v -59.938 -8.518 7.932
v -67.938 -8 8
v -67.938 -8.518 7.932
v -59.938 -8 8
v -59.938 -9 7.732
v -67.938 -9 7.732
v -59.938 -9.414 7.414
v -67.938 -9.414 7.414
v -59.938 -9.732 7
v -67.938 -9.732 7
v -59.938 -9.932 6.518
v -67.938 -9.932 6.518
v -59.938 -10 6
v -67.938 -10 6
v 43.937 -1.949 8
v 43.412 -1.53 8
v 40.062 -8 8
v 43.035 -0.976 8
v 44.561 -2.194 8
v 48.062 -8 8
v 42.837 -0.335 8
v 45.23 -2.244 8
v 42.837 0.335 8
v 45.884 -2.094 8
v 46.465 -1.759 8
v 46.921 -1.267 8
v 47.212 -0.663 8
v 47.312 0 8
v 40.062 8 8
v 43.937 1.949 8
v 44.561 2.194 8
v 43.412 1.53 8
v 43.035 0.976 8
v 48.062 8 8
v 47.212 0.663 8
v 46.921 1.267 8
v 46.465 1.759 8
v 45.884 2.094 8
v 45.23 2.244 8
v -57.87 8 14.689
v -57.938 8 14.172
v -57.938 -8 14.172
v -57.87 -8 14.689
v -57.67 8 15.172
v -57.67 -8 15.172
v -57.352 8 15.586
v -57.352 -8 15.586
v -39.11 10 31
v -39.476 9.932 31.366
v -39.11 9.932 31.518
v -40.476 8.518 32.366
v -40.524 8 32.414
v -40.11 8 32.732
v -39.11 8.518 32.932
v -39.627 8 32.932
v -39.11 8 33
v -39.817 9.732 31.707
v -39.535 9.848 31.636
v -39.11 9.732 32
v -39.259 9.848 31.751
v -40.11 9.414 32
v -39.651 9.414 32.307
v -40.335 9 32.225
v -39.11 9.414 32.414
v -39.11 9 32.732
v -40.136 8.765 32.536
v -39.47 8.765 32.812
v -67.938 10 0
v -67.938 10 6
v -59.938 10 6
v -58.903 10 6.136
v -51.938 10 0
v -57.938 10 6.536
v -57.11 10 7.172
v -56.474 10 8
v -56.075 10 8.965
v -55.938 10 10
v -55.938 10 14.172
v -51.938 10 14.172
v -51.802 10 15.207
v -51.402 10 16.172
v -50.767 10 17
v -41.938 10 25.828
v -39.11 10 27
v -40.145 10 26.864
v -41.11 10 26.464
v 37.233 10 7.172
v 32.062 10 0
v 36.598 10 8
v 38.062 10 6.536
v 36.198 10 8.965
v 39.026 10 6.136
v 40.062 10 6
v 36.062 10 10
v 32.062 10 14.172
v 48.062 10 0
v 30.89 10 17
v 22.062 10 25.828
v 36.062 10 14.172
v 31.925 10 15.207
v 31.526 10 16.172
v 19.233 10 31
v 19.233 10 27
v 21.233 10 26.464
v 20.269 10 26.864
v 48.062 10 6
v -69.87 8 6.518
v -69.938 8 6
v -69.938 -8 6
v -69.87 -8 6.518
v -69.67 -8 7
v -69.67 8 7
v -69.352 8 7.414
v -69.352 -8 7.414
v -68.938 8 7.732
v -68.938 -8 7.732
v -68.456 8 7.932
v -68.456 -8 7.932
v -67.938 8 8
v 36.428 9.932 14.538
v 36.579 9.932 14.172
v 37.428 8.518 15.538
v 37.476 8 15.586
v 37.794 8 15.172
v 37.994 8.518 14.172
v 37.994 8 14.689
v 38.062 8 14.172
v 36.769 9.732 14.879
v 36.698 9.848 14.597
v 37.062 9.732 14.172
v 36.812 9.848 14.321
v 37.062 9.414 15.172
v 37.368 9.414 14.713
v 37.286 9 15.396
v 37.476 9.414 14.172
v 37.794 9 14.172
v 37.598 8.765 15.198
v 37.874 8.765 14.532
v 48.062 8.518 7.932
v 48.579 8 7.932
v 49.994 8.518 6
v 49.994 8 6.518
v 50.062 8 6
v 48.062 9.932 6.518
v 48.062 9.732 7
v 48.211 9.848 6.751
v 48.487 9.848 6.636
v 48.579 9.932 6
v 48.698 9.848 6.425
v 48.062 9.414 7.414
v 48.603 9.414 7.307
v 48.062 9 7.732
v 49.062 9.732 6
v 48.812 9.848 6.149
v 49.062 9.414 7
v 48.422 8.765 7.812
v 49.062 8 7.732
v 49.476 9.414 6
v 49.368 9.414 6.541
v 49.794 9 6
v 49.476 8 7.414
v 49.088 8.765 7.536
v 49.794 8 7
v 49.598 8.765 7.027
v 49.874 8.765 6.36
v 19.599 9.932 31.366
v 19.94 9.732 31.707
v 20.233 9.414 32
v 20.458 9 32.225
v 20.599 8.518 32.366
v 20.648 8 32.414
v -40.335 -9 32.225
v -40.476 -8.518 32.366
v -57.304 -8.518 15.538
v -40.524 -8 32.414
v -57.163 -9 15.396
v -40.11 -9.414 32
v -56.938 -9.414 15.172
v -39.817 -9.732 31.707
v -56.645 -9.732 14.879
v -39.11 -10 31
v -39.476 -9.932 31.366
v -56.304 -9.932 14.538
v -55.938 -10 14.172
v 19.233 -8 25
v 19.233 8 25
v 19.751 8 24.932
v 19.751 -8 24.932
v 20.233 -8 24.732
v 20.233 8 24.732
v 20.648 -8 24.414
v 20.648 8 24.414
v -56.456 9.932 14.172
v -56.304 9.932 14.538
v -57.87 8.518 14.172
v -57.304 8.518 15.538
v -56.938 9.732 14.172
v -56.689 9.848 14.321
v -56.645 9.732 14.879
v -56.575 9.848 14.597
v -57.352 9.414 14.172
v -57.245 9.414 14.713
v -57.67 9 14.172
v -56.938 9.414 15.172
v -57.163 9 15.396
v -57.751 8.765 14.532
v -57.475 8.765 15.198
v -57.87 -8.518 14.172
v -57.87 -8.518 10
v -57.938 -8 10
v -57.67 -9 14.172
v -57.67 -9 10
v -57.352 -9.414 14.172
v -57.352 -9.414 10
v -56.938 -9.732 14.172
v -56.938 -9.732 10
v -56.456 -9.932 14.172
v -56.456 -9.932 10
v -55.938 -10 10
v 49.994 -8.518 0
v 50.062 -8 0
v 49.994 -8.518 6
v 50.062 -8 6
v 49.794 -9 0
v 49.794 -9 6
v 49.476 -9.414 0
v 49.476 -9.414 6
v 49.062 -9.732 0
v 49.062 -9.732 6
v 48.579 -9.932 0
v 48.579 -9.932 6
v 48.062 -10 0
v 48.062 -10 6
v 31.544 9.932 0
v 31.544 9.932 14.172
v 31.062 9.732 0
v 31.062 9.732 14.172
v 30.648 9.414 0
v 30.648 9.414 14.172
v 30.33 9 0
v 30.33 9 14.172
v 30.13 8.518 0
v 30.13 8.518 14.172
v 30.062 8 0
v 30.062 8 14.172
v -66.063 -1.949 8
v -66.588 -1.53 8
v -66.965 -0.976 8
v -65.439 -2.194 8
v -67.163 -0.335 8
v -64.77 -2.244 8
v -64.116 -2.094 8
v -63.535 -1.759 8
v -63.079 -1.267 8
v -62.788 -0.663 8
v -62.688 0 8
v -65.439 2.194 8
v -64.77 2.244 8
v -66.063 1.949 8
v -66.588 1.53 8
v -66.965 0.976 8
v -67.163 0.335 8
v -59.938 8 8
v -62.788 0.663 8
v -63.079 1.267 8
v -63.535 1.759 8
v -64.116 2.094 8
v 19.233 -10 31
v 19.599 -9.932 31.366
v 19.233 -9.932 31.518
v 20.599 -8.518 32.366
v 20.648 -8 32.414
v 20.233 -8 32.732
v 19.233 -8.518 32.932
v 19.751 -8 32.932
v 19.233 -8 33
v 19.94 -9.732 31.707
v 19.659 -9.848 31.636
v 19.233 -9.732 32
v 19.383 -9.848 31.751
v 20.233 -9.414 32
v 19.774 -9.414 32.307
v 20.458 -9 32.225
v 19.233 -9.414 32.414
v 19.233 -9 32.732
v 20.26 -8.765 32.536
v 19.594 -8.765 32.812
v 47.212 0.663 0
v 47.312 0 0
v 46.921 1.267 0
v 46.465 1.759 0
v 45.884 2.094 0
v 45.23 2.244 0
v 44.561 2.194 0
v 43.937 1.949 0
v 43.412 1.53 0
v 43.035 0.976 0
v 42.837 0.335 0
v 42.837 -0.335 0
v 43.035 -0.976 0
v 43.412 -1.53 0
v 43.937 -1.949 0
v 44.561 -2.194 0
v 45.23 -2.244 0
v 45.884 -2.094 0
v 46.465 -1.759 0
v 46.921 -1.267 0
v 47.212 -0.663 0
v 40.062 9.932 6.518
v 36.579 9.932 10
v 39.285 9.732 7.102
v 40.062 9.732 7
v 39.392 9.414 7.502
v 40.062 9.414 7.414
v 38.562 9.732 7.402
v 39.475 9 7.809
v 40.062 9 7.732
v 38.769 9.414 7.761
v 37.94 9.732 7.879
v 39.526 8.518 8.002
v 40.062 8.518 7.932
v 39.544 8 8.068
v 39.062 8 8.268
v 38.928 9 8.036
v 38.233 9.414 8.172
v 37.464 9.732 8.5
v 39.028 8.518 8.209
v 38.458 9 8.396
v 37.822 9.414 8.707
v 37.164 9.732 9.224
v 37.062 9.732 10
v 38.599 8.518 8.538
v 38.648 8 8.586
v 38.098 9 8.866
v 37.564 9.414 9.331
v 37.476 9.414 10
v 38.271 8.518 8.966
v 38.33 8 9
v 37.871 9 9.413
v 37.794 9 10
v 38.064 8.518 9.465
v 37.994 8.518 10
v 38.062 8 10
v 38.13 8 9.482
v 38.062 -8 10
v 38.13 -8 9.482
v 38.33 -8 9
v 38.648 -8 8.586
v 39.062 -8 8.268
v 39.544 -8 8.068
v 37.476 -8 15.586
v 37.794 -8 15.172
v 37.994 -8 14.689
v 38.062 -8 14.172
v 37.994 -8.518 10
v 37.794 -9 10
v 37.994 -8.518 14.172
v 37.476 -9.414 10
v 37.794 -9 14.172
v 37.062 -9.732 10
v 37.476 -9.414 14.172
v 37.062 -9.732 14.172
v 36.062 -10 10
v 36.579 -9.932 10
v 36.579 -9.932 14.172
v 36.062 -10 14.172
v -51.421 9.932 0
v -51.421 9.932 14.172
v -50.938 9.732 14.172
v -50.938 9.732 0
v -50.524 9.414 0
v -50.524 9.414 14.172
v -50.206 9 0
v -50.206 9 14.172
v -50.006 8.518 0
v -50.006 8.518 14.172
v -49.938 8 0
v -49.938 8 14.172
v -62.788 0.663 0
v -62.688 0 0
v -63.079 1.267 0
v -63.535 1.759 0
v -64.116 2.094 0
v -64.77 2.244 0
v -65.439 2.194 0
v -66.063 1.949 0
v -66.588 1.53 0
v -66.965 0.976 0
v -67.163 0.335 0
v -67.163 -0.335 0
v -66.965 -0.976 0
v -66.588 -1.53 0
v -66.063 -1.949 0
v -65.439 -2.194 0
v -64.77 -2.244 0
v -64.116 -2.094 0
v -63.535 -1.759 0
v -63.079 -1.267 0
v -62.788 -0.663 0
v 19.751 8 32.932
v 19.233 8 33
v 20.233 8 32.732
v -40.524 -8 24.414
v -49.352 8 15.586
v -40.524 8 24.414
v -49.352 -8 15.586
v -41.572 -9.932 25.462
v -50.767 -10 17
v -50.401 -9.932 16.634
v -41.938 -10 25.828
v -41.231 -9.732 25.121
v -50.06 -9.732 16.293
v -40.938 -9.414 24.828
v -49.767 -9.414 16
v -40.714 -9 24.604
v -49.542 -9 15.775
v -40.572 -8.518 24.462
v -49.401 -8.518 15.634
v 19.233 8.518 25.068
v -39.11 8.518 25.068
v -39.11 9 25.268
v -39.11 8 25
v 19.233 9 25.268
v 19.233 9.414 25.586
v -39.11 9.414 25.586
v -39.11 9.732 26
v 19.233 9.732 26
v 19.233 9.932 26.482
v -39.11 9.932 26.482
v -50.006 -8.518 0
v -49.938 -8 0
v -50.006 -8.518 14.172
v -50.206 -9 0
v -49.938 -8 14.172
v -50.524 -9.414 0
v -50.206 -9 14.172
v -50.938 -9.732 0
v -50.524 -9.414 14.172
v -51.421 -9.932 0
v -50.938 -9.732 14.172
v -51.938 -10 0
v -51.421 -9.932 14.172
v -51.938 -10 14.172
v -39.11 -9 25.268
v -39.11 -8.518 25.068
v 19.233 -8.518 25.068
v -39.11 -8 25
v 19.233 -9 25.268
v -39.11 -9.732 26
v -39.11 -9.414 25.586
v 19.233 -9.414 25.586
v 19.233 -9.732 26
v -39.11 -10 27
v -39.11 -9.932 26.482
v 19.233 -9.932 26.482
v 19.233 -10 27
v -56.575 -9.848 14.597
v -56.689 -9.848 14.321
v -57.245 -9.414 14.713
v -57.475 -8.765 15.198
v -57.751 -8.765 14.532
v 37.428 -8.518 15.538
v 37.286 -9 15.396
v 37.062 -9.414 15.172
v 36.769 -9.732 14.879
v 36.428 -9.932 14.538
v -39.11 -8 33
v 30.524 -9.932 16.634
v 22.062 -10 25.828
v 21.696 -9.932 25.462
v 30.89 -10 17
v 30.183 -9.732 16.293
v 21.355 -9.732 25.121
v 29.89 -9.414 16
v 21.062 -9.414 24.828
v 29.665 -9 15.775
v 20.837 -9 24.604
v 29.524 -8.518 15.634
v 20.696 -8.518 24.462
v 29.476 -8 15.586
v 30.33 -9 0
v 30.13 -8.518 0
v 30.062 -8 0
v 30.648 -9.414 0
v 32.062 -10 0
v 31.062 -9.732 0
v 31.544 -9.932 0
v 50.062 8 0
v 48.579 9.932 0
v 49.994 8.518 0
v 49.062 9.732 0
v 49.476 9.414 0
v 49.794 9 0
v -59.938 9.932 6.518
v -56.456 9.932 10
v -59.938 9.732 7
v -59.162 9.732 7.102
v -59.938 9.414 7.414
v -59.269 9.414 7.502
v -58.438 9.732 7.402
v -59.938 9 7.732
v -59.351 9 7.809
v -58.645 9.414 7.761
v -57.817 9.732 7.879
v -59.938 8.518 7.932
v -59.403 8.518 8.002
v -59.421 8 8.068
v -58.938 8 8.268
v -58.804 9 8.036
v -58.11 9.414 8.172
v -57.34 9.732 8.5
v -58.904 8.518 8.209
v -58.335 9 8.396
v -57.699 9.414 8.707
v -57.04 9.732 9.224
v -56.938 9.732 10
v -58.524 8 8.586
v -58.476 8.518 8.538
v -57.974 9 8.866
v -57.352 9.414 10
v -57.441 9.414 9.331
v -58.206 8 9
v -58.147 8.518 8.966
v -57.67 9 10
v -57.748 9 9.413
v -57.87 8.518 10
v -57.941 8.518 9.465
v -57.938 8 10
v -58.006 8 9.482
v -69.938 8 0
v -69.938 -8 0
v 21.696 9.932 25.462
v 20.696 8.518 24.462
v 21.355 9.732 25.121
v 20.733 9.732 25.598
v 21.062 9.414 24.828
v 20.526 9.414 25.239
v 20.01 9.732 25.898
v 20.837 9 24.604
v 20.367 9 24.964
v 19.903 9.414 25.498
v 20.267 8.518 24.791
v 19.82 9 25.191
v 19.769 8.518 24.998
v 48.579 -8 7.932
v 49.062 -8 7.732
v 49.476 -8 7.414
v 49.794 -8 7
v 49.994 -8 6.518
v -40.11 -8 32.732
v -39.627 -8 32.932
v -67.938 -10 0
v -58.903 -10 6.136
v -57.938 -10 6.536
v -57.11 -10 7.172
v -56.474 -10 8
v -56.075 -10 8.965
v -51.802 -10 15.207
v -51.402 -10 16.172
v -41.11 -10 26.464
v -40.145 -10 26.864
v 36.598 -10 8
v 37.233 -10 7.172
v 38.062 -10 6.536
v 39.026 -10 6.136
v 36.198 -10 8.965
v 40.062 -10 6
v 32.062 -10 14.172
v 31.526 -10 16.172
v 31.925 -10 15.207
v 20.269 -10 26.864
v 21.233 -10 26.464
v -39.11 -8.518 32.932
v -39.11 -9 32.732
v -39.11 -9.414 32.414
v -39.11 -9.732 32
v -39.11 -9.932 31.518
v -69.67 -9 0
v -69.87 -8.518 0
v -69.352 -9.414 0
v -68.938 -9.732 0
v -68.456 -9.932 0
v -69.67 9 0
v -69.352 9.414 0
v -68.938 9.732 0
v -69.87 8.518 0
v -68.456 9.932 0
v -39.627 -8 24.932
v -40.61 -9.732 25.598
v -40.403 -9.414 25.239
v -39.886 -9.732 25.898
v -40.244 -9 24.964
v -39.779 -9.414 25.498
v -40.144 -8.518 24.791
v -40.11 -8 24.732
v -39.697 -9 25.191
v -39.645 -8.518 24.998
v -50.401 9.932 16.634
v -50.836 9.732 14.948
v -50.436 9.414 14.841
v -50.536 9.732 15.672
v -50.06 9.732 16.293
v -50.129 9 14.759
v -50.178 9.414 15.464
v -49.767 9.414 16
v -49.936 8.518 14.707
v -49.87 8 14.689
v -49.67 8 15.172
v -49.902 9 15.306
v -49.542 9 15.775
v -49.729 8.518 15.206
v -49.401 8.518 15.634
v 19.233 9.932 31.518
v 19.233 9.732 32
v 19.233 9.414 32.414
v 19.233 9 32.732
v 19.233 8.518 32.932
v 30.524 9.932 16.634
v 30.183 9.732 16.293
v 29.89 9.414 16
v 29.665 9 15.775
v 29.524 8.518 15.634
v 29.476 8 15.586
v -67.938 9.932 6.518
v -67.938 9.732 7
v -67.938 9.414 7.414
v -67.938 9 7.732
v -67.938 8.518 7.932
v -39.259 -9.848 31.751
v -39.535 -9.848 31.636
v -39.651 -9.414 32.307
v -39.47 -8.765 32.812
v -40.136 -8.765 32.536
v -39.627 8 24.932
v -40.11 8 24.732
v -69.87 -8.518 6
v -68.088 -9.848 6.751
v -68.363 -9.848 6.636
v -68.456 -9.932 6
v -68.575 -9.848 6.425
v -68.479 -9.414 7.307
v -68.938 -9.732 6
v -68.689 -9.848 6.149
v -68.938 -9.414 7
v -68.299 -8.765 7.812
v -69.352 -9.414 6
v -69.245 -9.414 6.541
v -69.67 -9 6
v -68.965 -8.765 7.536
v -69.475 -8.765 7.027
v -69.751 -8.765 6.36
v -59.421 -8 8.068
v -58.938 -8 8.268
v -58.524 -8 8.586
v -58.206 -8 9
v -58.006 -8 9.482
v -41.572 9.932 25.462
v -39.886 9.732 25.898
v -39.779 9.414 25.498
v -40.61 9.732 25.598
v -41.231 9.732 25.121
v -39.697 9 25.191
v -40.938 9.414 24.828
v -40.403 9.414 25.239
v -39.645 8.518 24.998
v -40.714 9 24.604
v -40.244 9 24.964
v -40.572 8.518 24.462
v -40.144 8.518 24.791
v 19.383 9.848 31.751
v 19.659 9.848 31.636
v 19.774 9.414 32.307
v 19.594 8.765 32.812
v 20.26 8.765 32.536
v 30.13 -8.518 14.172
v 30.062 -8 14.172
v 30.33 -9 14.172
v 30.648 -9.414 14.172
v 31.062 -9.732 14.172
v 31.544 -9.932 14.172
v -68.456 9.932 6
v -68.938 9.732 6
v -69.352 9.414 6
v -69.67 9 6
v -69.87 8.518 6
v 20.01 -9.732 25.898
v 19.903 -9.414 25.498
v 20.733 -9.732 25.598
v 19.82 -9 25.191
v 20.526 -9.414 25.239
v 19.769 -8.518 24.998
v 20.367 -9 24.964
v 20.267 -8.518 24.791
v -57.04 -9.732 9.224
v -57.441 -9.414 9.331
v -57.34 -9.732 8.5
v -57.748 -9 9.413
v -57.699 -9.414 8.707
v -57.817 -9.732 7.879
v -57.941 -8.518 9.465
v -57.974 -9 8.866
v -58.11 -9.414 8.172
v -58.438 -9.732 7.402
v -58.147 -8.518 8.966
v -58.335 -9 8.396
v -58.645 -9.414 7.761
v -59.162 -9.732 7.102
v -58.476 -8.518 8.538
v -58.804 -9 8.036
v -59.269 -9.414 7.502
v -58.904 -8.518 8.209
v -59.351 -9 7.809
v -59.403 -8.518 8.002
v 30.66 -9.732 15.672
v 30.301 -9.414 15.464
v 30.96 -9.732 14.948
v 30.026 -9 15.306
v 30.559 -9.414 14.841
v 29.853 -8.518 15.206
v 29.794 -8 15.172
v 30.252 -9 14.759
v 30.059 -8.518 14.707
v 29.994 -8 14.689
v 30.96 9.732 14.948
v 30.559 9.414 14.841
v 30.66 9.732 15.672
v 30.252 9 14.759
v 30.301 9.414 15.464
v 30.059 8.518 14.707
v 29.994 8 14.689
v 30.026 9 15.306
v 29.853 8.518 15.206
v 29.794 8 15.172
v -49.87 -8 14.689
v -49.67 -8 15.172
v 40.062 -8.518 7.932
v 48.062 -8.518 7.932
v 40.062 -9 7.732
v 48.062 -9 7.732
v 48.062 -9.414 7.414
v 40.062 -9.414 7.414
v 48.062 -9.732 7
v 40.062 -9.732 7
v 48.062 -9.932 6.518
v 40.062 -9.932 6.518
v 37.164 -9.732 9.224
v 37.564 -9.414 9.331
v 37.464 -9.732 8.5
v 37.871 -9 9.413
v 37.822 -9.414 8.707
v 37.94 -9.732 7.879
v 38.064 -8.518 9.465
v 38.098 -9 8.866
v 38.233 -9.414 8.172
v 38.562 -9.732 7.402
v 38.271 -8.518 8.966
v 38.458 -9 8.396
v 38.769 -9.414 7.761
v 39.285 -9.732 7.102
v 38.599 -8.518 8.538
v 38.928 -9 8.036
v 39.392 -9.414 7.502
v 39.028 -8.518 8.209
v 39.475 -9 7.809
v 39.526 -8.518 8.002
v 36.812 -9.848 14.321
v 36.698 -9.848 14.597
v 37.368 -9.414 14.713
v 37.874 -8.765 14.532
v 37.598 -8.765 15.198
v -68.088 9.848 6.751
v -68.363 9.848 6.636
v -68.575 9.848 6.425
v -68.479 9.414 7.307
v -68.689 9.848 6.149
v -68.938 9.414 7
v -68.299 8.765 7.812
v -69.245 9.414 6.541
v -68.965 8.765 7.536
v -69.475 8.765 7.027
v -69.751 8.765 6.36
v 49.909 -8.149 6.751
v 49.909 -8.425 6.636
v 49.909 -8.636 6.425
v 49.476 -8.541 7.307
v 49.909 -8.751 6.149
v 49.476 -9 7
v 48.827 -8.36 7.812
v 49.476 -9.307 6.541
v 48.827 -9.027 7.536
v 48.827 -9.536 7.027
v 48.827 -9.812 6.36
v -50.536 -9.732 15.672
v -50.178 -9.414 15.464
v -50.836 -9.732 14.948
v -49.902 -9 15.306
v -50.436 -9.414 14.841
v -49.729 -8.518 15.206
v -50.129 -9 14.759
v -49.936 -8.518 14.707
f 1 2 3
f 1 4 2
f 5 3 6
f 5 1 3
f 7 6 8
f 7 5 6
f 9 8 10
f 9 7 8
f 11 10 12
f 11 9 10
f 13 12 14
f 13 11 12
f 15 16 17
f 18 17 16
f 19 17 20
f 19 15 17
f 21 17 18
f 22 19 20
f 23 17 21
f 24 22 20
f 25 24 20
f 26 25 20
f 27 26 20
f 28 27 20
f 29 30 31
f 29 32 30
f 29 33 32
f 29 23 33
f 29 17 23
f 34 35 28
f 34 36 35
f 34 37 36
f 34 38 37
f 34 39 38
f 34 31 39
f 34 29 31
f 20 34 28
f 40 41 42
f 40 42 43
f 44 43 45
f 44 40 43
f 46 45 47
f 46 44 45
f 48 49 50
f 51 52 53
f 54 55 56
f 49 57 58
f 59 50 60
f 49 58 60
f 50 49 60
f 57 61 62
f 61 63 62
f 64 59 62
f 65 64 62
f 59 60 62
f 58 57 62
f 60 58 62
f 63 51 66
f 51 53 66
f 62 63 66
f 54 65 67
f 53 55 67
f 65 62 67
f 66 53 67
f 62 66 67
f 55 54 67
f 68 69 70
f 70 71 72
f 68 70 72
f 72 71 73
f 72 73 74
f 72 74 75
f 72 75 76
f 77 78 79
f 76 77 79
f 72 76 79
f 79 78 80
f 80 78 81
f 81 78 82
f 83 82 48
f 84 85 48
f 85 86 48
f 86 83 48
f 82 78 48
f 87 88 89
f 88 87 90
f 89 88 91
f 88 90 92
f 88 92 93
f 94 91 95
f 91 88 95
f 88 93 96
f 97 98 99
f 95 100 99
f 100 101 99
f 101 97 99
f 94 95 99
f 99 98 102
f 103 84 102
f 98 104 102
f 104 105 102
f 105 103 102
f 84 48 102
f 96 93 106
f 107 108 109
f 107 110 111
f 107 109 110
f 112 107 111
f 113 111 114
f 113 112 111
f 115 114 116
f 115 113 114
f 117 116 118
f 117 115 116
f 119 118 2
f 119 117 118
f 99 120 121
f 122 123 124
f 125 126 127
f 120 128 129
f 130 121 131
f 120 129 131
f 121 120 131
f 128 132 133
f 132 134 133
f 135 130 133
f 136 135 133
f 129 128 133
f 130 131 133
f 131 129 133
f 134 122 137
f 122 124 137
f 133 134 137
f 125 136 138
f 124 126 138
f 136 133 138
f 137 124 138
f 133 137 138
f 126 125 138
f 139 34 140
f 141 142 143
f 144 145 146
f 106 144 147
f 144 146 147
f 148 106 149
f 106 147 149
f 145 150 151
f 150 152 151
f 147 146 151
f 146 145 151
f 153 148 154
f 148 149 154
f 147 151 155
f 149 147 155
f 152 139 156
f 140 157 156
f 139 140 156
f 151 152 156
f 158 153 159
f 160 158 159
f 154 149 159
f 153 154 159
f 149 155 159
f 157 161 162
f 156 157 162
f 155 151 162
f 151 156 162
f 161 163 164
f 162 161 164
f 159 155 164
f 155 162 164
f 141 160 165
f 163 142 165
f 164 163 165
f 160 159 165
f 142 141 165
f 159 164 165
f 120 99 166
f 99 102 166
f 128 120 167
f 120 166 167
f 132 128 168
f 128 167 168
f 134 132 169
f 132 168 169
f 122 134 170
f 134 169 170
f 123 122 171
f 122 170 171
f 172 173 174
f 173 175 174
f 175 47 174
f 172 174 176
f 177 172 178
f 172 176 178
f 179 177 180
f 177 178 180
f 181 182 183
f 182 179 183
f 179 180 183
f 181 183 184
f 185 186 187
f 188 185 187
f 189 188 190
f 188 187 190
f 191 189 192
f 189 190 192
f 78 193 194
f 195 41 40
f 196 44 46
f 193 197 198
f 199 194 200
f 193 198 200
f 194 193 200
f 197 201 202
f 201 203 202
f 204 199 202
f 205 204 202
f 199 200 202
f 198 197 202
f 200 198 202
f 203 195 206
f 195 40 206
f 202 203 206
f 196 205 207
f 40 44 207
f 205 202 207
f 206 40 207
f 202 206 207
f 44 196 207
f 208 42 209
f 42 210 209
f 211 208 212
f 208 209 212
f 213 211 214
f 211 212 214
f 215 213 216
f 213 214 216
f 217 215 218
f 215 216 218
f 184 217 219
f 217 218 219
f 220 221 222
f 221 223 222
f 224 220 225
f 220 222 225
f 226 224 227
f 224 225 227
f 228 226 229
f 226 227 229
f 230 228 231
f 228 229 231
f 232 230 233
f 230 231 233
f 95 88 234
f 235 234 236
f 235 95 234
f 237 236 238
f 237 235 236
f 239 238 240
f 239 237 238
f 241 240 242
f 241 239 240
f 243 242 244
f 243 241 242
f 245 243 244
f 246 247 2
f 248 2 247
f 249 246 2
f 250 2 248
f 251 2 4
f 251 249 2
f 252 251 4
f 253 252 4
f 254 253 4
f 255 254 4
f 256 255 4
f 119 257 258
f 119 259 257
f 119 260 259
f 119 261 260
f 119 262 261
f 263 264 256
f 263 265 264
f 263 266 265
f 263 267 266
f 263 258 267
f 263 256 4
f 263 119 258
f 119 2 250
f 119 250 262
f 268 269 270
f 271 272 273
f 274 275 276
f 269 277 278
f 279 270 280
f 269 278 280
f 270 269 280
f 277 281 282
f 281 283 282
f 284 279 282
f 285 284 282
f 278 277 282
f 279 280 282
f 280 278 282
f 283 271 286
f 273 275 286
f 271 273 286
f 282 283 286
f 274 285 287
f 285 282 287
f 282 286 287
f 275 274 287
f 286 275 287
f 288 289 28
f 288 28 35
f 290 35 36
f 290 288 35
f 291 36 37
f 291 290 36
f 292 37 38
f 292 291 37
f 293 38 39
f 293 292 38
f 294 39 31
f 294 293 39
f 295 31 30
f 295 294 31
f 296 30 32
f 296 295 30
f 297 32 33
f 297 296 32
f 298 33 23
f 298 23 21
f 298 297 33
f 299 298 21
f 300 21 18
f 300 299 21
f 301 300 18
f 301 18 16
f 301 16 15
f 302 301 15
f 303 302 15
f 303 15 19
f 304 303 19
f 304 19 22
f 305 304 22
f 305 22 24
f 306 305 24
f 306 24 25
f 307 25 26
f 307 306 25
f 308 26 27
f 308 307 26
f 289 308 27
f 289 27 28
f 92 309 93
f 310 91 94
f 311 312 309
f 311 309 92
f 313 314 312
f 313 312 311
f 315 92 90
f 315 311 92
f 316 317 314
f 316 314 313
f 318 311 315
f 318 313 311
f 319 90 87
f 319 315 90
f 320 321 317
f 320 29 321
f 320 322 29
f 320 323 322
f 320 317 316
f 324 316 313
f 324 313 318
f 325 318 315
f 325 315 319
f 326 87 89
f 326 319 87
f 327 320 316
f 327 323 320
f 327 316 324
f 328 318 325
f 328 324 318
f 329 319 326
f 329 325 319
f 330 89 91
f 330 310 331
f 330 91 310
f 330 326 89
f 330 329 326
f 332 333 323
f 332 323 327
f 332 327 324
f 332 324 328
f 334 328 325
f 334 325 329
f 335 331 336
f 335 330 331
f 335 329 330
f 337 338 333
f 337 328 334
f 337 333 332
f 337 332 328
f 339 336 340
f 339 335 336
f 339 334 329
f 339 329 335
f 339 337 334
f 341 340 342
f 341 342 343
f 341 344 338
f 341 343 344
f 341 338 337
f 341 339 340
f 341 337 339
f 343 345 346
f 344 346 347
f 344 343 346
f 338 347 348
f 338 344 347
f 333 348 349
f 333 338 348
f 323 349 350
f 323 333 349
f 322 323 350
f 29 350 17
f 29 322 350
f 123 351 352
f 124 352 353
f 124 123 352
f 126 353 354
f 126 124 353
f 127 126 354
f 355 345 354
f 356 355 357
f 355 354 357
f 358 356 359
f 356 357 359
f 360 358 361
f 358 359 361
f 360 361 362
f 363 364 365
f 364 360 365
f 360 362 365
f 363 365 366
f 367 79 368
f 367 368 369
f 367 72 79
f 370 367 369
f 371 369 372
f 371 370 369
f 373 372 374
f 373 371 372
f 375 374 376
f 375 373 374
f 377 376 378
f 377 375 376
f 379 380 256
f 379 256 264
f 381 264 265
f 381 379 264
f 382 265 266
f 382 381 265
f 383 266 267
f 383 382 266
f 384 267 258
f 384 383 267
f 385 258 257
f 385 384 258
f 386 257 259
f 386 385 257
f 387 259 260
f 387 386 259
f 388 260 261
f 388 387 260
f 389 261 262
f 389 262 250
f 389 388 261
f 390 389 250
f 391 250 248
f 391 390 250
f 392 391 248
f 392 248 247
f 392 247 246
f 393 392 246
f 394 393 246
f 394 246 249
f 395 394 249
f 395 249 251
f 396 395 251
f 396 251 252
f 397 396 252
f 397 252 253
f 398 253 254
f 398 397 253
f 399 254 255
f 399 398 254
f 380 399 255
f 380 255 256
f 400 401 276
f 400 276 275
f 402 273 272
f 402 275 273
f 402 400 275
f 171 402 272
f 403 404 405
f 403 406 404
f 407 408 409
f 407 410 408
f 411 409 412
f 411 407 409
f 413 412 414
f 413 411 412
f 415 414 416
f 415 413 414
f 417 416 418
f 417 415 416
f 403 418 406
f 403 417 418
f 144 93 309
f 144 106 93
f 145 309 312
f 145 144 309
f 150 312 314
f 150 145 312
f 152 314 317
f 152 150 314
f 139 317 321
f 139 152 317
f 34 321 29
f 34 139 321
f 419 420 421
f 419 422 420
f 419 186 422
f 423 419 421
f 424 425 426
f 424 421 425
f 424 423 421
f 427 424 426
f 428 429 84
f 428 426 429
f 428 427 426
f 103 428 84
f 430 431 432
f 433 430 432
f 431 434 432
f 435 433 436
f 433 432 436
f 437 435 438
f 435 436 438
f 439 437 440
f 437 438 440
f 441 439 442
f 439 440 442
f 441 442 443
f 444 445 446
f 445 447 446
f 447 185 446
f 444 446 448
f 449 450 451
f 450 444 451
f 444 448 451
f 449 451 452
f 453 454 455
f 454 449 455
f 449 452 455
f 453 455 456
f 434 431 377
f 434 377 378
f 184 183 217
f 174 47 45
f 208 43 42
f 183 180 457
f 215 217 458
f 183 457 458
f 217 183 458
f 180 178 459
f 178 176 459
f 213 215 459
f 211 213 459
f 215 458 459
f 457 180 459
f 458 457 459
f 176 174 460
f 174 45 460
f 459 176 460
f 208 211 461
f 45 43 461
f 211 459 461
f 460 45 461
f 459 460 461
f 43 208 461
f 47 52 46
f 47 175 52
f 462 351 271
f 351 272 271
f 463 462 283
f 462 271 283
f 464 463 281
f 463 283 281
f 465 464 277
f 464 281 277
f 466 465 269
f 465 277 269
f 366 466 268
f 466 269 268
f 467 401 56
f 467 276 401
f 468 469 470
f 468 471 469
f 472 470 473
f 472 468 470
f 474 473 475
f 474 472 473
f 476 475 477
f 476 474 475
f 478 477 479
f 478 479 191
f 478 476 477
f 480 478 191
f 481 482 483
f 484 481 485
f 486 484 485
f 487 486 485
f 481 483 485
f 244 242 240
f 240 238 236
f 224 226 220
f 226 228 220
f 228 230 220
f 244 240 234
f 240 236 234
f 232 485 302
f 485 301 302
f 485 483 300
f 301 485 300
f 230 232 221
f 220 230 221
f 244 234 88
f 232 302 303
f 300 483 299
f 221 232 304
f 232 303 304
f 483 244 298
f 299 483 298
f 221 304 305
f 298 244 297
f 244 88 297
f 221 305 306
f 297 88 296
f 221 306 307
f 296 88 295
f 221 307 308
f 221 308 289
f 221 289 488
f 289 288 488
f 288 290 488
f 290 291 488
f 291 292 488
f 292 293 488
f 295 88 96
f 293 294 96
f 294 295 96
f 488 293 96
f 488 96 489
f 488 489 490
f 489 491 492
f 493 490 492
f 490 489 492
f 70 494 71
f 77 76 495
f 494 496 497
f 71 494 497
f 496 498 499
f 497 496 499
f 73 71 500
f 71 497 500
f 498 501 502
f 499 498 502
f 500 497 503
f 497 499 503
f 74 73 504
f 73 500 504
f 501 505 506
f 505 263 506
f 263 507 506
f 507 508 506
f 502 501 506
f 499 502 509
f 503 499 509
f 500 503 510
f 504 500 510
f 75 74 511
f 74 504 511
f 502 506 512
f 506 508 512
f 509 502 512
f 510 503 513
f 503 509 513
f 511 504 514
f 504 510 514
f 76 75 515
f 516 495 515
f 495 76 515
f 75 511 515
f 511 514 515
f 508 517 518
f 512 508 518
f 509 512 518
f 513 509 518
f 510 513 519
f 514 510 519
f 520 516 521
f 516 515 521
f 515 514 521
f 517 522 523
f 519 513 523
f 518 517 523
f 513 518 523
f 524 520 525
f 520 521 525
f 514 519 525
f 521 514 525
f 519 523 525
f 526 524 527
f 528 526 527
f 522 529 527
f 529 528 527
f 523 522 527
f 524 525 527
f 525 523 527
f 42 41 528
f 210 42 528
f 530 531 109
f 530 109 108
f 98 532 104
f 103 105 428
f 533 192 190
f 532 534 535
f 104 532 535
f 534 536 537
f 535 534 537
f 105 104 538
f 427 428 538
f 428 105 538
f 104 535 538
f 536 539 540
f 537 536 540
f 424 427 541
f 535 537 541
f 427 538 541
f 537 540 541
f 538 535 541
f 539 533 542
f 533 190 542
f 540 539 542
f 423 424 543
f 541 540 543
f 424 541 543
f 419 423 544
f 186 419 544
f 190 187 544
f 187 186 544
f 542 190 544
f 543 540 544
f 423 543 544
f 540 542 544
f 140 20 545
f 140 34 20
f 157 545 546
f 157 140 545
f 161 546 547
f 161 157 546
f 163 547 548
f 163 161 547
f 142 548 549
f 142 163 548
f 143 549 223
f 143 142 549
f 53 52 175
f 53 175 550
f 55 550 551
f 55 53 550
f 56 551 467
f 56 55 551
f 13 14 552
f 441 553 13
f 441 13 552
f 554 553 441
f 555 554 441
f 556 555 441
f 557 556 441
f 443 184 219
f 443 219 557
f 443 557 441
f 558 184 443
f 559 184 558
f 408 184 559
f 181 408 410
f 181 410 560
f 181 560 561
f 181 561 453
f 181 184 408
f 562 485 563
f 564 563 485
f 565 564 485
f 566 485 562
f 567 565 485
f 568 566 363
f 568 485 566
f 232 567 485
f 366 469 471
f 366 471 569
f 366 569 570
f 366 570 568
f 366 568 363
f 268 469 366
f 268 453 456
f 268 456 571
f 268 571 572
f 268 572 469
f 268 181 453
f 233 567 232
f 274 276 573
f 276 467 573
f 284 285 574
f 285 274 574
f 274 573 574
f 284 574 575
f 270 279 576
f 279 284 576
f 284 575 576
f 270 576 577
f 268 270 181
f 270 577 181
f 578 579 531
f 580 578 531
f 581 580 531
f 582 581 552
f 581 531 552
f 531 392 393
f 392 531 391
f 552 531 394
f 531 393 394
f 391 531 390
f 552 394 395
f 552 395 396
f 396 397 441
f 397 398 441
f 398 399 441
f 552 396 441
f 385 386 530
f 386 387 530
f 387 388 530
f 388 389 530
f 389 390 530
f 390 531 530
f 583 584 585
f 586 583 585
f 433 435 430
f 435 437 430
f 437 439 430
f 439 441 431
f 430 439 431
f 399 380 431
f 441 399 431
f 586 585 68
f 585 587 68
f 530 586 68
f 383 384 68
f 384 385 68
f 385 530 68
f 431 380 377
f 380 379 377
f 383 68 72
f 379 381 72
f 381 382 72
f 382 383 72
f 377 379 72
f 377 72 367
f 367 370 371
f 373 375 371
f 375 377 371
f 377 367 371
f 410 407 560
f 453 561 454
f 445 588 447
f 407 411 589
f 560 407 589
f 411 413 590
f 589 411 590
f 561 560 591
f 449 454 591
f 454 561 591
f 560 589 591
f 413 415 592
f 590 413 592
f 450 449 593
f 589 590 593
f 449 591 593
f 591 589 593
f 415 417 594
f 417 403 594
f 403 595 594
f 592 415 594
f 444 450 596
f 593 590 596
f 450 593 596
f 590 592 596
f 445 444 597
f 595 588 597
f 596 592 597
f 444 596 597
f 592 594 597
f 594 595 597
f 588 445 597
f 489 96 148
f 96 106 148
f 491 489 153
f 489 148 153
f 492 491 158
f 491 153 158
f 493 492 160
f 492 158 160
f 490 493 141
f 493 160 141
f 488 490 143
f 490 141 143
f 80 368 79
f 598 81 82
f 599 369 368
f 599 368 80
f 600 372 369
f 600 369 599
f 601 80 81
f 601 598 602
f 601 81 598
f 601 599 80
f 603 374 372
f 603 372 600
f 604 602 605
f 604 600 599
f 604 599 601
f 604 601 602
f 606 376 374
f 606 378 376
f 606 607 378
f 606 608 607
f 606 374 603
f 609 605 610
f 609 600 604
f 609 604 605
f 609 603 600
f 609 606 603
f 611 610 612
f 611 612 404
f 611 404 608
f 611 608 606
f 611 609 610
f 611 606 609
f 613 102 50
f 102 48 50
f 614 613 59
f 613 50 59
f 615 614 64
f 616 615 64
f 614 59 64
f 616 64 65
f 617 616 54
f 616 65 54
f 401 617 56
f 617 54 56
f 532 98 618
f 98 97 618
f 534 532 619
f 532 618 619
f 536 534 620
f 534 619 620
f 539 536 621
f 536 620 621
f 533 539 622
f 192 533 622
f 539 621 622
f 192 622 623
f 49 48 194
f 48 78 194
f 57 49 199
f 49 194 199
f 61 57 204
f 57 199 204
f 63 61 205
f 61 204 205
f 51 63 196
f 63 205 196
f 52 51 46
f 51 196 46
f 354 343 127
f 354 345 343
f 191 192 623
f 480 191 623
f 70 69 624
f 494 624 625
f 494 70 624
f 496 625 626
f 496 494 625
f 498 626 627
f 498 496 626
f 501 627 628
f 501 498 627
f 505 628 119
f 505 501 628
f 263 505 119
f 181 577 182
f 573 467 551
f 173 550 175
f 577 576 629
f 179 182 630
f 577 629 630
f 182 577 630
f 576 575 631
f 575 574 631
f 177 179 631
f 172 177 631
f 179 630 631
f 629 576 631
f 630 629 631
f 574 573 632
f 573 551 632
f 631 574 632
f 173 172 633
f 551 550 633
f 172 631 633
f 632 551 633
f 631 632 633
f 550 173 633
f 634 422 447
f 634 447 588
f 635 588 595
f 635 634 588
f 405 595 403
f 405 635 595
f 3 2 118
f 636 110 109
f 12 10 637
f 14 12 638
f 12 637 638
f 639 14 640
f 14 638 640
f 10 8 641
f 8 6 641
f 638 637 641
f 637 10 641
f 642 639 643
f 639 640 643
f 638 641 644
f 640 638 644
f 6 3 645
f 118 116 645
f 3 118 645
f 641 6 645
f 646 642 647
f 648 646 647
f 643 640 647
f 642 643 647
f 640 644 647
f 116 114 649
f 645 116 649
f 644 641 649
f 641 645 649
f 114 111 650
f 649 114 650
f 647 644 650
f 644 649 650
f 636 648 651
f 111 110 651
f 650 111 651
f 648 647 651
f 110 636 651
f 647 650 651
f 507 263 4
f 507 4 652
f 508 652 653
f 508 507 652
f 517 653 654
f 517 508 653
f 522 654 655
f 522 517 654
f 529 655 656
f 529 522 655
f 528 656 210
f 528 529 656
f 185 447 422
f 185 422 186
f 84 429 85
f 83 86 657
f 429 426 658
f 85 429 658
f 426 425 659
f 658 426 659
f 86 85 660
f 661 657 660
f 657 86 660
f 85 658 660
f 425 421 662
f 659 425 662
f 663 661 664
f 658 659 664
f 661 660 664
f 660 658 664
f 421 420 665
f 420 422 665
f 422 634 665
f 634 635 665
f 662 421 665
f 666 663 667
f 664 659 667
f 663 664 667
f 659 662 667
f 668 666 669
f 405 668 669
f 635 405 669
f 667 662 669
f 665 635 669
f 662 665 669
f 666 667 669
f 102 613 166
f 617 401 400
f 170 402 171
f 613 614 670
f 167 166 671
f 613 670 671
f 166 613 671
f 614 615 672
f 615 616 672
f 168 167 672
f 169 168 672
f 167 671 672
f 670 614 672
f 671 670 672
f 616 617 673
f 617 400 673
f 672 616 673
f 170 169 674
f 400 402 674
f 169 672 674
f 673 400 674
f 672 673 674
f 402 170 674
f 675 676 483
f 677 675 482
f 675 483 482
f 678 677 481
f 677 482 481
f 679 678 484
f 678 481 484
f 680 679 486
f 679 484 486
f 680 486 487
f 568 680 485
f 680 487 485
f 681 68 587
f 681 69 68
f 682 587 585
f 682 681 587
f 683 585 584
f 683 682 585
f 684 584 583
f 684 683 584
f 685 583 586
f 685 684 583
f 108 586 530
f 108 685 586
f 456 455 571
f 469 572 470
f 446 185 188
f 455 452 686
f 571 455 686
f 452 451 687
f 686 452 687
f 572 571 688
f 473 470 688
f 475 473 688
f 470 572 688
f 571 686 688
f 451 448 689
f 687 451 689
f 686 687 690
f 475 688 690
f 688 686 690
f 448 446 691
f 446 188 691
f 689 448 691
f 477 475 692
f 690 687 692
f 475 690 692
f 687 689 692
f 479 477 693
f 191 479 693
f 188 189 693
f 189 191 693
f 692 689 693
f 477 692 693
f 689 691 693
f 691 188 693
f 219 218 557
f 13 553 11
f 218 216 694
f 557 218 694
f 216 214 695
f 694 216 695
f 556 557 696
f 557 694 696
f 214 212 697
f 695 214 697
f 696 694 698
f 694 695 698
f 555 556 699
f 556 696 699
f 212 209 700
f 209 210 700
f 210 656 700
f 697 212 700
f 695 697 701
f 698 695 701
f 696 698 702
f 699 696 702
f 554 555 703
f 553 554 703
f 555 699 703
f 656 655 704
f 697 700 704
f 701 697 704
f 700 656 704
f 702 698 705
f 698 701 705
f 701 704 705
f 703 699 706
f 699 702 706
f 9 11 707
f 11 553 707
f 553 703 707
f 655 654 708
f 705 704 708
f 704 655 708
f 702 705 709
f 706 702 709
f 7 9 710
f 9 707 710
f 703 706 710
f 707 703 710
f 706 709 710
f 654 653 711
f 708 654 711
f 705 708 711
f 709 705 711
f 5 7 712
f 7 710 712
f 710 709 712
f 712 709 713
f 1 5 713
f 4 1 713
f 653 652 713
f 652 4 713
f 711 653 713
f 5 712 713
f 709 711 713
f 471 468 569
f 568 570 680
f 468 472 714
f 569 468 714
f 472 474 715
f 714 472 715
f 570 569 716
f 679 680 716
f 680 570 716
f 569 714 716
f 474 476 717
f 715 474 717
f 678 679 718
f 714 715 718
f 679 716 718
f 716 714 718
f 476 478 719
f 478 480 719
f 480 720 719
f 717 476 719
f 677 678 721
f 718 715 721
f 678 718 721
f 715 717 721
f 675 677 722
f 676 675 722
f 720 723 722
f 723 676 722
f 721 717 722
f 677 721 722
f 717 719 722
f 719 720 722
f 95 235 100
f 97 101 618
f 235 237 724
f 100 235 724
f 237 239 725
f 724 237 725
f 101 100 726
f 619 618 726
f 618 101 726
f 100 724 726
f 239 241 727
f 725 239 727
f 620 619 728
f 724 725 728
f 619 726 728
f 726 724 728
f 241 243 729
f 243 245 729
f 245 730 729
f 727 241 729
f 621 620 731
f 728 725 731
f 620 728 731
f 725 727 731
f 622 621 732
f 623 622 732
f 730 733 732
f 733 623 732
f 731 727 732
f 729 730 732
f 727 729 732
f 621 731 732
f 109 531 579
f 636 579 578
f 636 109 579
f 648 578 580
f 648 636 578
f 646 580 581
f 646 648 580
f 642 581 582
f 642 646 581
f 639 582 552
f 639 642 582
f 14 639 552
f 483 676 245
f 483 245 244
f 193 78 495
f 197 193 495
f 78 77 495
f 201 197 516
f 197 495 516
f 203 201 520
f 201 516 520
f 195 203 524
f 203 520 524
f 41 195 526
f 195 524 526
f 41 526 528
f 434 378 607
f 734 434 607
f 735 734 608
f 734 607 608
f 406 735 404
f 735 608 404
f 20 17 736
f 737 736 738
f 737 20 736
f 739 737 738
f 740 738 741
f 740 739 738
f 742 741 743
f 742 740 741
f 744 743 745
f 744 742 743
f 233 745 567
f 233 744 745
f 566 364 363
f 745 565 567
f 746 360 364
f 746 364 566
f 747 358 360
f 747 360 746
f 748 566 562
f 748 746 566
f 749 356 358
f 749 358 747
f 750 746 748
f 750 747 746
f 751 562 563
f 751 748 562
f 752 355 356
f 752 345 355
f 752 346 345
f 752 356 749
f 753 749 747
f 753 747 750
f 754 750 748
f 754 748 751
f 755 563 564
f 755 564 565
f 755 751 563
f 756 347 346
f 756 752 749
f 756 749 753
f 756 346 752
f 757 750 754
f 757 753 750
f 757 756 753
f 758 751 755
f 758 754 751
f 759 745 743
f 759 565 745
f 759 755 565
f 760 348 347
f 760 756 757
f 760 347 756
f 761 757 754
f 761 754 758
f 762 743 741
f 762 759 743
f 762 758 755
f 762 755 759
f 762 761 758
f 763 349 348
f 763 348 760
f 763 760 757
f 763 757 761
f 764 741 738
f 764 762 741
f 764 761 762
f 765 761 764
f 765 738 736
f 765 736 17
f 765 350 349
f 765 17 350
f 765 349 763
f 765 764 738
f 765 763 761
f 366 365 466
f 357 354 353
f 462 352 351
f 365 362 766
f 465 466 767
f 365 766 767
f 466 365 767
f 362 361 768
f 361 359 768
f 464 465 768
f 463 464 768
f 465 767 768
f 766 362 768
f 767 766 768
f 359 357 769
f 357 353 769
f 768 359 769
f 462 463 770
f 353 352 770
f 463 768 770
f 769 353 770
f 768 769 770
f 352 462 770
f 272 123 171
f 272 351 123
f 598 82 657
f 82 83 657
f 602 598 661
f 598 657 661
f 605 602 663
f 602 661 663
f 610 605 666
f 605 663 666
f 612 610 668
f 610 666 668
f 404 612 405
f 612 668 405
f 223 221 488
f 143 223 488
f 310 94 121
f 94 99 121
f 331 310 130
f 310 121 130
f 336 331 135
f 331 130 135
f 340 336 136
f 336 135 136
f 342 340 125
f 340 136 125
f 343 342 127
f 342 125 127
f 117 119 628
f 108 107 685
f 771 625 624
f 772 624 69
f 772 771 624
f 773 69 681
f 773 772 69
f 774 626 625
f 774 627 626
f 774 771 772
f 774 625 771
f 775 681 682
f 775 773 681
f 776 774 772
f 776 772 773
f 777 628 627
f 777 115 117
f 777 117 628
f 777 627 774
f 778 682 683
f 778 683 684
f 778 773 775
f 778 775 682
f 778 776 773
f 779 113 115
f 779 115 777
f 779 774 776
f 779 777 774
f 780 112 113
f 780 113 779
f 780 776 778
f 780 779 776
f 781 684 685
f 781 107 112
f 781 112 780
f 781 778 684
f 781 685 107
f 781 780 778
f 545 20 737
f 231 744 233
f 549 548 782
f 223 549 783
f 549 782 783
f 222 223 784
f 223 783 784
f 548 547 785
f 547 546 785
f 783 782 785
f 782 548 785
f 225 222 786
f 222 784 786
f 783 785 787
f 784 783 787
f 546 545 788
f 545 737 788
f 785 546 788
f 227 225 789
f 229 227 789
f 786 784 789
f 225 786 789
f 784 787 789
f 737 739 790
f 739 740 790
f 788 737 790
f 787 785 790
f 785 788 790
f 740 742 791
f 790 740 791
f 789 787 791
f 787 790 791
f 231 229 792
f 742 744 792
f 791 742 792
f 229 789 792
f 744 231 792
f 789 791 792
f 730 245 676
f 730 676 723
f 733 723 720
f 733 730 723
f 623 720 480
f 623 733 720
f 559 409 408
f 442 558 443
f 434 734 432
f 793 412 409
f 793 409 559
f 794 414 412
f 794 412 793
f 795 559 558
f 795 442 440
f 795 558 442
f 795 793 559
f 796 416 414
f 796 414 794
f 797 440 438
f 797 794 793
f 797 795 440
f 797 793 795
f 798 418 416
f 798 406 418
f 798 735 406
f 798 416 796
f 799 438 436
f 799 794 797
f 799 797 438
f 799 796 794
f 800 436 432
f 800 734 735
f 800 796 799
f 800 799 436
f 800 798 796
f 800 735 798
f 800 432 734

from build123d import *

# Parameters (mm, degrees)
SKETCH1_W             = 20
SKETCH1_H             = 20
SKETCH1_R             = 2.25
BOSS_EXTRUDE1_DEPTH   = 8
BOSS_EXTRUDE1_2_DEPTH = 8
BOSS_EXTRUDE2_DEPTH   = 20
FILLET2_R             = 2


with BuildPart() as part:
    # Sketch1 → Boss-Extrude1 (new body)
    with BuildSketch(Plane.XY):
        with Locations((-59.938271605, 0)):
            Rectangle(SKETCH1_W, SKETCH1_H)
        with Locations((-64.938271605, 0)):
            Circle(SKETCH1_R, mode=Mode.SUBTRACT)
    extrude(amount=BOSS_EXTRUDE1_DEPTH)



with BuildPart() as body_2:
    # Sketch1 → Boss-Extrude1 2 (new body)
    with BuildSketch(Plane.XY):
        with Locations((40.061728395, 0)):
            Rectangle(SKETCH1_W, SKETCH1_H)
        with Locations((45.061728395, 0)):
            Circle(SKETCH1_R, mode=Mode.SUBTRACT)
    extrude(amount=BOSS_EXTRUDE1_2_DEPTH)


with BuildPart() as part_1:
    add(part.part)

    add(body_2.part)  # Boss-Extrude2 merges body 2
    # Sketch2 → Boss-Extrude2 (add, through all)
    with BuildSketch(Plane.XZ.offset(10)):
        Polygon((-39.938271605, 25), (20.061728395, 25), (30.061728395, 15), (30.061728395, 8), (38.061728395, 8), (38.061728395, 15), (20.061728395, 33), (-39.938271605, 33), (-57.938271605, 15), (-57.938271605, 8), (-49.938271605, 8), (-49.938271605, 15), align=None)
    extrude(amount=-BOSS_EXTRUDE2_DEPTH)

    # Fillet2
    fillet2_edges = [part_1.edges().sort_by_distance(p)[0] for p in [
        (-69.938271605, 0, 8),
        (-63.938271605, -10, 8),
        (-63.938271605, 10, 8),
        (-44.938271605, 10, 20),
        (-39.938271605, 0, 25),
        (-49.938271605, 0, 15),
        (-57.938271605, 10, 11.5),
        (-57.938271605, 0, 8),
        (-48.938271605, 10, 24),
        (-57.938271605, 0, 15),
        (-9.938271605, 10, 33),
        (-39.938271605, 0, 33),
        (29.061728395, 10, 24),
        (20.061728395, 0, 33),
        (38.061728395, 10, 11.5),
        (38.061728395, 0, 15),
        (38.061728395, 0, 8),
        (30.061728395, 10, 7.5),
        (25.061728395, 10, 20),
        (30.061728395, 0, 15),
        (-9.938271605, 10, 25),
        (20.061728395, 0, 25),
        (-44.938271605, -10, 20),
        (-9.938271605, -10, 25),
        (25.061728395, -10, 20),
        (30.061728395, -10, 7.5),
        (38.061728395, -10, 11.5),
        (29.061728395, -10, 24),
        (-9.938271605, -10, 33),
        (-48.938271605, -10, 24),
        (-57.938271605, -10, 11.5),
        (44.061728395, -10, 8),
        (50.061728395, 0, 8),
        (44.061728395, 10, 8),
        (50.061728395, -10, 4),
        (50.061728395, 10, 4),
        (-49.938271605, -10, 7.5),
        (-69.938271605, -10, 4),
        (-69.938271605, 10, 4),
        (-49.938271605, 10, 7.5),
    ]]
    fillet(fillet2_edges, radius=FILLET2_R)


solid = part_1.part
